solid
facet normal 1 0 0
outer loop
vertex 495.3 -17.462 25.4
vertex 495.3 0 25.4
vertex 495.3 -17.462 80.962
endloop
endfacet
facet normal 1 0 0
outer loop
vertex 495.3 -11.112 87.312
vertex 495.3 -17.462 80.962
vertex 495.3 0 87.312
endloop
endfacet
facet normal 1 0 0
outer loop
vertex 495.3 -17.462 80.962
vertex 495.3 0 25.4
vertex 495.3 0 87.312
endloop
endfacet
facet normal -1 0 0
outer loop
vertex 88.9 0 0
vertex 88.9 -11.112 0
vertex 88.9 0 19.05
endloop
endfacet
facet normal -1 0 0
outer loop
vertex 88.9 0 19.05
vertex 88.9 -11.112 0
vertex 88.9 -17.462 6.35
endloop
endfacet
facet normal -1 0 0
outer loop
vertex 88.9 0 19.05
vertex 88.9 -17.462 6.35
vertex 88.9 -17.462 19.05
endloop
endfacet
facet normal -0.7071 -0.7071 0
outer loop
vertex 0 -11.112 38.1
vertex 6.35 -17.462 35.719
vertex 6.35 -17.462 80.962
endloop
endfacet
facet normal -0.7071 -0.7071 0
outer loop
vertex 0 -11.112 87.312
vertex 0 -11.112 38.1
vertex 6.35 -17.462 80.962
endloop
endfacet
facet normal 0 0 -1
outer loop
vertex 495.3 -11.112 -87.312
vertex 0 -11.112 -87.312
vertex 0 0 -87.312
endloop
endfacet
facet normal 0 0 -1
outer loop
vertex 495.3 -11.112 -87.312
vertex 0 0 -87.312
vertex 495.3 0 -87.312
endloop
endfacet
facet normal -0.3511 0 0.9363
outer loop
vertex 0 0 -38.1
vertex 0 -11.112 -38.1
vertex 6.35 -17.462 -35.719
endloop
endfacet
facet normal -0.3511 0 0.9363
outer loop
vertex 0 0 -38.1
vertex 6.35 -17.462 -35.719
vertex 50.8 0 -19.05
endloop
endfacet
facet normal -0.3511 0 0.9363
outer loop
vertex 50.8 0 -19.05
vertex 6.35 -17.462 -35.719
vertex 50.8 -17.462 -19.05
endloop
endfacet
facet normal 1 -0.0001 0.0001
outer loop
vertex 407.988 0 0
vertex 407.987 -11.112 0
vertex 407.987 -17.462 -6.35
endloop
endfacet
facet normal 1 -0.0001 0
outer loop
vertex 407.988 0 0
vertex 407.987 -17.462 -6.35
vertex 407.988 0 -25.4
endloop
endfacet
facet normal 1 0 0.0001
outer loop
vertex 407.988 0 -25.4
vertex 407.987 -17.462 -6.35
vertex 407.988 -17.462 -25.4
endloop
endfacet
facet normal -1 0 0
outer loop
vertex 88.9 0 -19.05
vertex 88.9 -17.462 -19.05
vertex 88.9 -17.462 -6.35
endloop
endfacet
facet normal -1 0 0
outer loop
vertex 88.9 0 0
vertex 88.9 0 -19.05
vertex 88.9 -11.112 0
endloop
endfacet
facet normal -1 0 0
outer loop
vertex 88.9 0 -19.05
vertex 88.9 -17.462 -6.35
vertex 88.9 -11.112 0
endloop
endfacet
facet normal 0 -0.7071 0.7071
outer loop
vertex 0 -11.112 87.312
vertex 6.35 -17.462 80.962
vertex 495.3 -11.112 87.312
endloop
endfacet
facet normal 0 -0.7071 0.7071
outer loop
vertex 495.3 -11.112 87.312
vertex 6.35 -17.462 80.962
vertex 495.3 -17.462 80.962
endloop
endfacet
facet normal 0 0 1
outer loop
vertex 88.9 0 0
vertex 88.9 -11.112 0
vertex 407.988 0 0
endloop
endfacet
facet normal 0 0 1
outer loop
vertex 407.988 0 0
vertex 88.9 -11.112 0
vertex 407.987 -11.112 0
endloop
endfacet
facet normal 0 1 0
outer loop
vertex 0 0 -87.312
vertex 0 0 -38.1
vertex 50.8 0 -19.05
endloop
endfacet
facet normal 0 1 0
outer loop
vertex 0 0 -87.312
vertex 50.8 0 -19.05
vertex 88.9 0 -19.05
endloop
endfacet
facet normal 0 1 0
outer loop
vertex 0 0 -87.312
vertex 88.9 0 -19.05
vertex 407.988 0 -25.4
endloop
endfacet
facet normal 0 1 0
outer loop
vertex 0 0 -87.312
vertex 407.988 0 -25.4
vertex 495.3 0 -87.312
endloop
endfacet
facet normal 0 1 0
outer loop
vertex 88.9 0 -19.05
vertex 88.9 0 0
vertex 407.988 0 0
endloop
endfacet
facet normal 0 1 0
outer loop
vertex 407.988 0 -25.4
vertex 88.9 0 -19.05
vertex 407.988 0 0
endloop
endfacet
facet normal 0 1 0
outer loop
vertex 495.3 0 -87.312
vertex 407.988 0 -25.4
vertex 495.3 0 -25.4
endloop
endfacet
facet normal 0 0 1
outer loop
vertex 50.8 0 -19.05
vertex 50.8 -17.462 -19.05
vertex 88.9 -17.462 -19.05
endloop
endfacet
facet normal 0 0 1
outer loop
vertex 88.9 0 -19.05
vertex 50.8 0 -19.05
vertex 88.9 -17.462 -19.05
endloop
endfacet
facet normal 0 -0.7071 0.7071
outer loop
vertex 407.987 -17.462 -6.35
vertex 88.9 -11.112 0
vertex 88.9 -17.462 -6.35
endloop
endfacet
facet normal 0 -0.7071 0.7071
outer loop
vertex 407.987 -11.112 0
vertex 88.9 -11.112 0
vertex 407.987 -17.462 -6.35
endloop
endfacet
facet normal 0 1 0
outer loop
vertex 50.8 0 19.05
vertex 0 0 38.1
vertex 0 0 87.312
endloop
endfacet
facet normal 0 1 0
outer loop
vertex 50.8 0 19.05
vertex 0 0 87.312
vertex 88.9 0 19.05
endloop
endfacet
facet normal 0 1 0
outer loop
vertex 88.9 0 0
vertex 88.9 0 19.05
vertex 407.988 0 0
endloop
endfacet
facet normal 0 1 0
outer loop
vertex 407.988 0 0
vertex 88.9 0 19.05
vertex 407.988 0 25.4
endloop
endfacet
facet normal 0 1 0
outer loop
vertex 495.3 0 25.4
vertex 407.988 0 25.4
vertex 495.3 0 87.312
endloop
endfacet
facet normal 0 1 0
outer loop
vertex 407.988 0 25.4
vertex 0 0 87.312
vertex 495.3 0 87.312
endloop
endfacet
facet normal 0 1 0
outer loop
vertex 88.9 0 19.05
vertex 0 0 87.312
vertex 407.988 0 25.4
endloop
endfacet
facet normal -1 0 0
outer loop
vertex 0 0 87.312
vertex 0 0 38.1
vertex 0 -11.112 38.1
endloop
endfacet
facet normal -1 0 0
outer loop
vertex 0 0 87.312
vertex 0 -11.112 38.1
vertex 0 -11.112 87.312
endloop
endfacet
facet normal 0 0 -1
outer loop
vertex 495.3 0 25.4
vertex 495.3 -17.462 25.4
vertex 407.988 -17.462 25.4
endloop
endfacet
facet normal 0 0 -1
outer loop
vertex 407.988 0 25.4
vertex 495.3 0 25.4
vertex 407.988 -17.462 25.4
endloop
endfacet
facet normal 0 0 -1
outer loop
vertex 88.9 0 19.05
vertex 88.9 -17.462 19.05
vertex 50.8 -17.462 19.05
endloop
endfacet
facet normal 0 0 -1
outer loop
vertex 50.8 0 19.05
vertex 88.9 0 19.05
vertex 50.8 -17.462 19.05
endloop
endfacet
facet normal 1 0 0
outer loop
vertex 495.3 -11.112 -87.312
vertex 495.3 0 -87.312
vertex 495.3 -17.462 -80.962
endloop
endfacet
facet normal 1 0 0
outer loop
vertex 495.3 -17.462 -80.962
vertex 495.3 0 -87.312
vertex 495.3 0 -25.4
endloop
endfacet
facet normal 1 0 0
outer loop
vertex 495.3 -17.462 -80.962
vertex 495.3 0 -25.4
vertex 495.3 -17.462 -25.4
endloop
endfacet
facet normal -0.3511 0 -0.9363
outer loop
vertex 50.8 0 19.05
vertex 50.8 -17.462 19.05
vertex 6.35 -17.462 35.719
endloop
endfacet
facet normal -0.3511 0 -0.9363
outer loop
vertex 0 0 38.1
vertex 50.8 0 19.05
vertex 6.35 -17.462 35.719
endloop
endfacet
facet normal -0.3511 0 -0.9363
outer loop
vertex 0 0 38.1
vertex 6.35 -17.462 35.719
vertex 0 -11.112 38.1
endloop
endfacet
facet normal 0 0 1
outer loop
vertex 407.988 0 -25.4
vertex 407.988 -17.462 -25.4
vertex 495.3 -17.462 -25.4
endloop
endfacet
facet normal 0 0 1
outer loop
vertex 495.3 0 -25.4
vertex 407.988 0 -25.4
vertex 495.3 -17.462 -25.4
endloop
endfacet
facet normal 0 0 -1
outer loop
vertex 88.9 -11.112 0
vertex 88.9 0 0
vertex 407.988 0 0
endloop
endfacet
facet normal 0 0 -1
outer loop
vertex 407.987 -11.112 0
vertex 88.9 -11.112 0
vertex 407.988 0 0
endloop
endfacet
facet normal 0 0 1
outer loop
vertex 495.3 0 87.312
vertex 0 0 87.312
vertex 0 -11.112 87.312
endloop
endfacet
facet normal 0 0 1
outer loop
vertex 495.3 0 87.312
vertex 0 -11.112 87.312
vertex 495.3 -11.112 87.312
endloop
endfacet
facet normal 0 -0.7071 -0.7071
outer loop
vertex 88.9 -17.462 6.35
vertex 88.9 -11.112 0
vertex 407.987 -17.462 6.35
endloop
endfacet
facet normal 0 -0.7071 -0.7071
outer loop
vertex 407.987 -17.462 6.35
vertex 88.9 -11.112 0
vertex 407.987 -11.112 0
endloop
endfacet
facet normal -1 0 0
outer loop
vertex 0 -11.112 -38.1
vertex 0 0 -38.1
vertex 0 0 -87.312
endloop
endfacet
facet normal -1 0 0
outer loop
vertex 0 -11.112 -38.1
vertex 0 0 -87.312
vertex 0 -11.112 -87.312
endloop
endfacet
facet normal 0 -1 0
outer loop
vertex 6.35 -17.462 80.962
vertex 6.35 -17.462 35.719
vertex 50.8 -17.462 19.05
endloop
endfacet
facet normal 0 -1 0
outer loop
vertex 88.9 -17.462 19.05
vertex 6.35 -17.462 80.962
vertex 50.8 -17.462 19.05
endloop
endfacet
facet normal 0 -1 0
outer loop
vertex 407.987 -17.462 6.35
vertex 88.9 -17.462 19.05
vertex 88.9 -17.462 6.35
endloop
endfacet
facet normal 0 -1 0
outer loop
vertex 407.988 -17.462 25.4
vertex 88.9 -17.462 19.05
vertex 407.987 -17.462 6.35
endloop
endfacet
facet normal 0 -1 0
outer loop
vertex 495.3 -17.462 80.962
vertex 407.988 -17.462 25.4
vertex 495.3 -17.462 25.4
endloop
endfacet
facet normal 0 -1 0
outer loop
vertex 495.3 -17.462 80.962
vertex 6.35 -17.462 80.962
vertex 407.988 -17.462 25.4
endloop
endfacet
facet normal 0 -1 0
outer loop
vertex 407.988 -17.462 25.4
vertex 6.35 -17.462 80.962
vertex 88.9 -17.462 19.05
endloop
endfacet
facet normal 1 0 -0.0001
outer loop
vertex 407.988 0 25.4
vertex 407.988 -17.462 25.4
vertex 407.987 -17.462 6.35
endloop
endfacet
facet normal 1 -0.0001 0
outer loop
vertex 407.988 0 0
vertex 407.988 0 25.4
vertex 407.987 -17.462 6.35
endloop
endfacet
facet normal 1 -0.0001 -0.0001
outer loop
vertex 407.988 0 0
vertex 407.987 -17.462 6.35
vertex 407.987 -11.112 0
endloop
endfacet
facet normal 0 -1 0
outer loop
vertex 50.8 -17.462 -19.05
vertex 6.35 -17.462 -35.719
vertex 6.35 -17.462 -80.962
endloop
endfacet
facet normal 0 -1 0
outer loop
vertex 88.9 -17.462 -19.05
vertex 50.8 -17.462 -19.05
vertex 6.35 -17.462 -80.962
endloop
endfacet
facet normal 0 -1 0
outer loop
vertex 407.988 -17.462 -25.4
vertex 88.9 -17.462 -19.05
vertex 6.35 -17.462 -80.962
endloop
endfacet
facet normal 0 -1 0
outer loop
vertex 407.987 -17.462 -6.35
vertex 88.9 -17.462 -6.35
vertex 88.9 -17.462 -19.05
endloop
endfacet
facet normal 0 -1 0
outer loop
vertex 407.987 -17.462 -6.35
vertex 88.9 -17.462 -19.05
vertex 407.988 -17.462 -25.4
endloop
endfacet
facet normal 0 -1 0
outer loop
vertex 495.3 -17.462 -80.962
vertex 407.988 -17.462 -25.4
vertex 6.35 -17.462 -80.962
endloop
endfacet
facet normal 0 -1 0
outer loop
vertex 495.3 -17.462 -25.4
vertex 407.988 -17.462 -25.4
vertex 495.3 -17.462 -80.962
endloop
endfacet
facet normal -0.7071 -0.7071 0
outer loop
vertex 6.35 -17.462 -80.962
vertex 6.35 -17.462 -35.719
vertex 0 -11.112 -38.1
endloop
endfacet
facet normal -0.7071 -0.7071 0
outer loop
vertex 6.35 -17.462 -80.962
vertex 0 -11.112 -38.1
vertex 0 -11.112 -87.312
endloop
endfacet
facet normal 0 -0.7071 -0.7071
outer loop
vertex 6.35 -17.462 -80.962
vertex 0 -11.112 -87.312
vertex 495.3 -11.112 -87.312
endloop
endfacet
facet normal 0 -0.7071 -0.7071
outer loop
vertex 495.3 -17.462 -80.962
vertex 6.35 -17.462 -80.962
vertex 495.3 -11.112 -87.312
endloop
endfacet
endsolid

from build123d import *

# Parameters (mm, degrees)
F0_W      = 495.3
F0_H      = 87.3125
F1_DEPTH  = 17.4625
F2_W      = 495.3
F2_H      = 17.4625
F3_DEPTH  = 87.3125
F5_DEPTH  = 25.4
F6_SIZE   = 6.35
F6_2_SIZE = 6.35
F7_SIZE   = 6.35


with BuildPart() as f1:
    # F0 (on Front) → F1 (new body)
    with BuildSketch(Plane.XZ):
        with Locations((247.65, 43.65625)):
            Rectangle(F0_W, F0_H)
    extrude(amount=F1_DEPTH)


with BuildPart() as f3:
    # F2 (on face) → F3 (new body)
    with BuildSketch(Plane(origin=(0, 0, 0), x_dir=(1, 0, 0), z_dir=(0, 0, -1))):
        with Locations((247.65, 8.73125)):
            Rectangle(F2_W, F2_H)
    extrude(amount=F3_DEPTH)


with BuildPart() as f5_tool:
    # F4 (on face) → F5 (new body)
    with BuildSketch(Plane.XZ.offset(17.4625)):
        Polygon((495.3, -25.4), (495.3, 0), (495.3, 25.4), (407.9875, 25.4), (407.9875, 0), (407.9875, -25.4), align=None)
        Polygon((50.8, 19.05), (0, 38.1), (0, 0), (88.9, 0), (88.9, 19.05), align=None)
        Polygon((88.9, 0), (0, 0), (0, -38.1), (50.8, -19.05), (88.9, -19.05), align=None)
    extrude(amount=-F5_DEPTH)


with BuildPart() as f1_1:
    add(f1.part)

    # F5: cut by f5_tool
    add(f5_tool.part, mode=Mode.SUBTRACT)

    # F6
    f6_edges = [f1_1.edges().sort_by_distance(p)[0] for p in [
        (247.65, -17.4625, 87.3125),
        (248.44375, -17.4625, 0),
        (0, -17.4625, 62.70625),
    ]]
    chamfer(f6_edges, length=F6_SIZE)


with BuildPart() as f3_1:
    add(f3.part)

    # F5: cut by f5_tool
    add(f5_tool.part, mode=Mode.SUBTRACT)

    # F6#2
    f6_2_edges = [f3_1.edges().sort_by_distance(p)[0] for p in [
        (247.65, -17.4625, -87.3125),
        (0, -17.4625, -62.70625),
    ]]
    chamfer(f6_2_edges, length=F6_2_SIZE)

    # F7
    f7_edges = [f3_1.edges().sort_by_distance(p)[0] for p in [
        (248.44375, -17.4625, 0),
    ]]
    chamfer(f7_edges, length=F7_SIZE)


solid = Compound([f1_1.part, f3_1.part])
